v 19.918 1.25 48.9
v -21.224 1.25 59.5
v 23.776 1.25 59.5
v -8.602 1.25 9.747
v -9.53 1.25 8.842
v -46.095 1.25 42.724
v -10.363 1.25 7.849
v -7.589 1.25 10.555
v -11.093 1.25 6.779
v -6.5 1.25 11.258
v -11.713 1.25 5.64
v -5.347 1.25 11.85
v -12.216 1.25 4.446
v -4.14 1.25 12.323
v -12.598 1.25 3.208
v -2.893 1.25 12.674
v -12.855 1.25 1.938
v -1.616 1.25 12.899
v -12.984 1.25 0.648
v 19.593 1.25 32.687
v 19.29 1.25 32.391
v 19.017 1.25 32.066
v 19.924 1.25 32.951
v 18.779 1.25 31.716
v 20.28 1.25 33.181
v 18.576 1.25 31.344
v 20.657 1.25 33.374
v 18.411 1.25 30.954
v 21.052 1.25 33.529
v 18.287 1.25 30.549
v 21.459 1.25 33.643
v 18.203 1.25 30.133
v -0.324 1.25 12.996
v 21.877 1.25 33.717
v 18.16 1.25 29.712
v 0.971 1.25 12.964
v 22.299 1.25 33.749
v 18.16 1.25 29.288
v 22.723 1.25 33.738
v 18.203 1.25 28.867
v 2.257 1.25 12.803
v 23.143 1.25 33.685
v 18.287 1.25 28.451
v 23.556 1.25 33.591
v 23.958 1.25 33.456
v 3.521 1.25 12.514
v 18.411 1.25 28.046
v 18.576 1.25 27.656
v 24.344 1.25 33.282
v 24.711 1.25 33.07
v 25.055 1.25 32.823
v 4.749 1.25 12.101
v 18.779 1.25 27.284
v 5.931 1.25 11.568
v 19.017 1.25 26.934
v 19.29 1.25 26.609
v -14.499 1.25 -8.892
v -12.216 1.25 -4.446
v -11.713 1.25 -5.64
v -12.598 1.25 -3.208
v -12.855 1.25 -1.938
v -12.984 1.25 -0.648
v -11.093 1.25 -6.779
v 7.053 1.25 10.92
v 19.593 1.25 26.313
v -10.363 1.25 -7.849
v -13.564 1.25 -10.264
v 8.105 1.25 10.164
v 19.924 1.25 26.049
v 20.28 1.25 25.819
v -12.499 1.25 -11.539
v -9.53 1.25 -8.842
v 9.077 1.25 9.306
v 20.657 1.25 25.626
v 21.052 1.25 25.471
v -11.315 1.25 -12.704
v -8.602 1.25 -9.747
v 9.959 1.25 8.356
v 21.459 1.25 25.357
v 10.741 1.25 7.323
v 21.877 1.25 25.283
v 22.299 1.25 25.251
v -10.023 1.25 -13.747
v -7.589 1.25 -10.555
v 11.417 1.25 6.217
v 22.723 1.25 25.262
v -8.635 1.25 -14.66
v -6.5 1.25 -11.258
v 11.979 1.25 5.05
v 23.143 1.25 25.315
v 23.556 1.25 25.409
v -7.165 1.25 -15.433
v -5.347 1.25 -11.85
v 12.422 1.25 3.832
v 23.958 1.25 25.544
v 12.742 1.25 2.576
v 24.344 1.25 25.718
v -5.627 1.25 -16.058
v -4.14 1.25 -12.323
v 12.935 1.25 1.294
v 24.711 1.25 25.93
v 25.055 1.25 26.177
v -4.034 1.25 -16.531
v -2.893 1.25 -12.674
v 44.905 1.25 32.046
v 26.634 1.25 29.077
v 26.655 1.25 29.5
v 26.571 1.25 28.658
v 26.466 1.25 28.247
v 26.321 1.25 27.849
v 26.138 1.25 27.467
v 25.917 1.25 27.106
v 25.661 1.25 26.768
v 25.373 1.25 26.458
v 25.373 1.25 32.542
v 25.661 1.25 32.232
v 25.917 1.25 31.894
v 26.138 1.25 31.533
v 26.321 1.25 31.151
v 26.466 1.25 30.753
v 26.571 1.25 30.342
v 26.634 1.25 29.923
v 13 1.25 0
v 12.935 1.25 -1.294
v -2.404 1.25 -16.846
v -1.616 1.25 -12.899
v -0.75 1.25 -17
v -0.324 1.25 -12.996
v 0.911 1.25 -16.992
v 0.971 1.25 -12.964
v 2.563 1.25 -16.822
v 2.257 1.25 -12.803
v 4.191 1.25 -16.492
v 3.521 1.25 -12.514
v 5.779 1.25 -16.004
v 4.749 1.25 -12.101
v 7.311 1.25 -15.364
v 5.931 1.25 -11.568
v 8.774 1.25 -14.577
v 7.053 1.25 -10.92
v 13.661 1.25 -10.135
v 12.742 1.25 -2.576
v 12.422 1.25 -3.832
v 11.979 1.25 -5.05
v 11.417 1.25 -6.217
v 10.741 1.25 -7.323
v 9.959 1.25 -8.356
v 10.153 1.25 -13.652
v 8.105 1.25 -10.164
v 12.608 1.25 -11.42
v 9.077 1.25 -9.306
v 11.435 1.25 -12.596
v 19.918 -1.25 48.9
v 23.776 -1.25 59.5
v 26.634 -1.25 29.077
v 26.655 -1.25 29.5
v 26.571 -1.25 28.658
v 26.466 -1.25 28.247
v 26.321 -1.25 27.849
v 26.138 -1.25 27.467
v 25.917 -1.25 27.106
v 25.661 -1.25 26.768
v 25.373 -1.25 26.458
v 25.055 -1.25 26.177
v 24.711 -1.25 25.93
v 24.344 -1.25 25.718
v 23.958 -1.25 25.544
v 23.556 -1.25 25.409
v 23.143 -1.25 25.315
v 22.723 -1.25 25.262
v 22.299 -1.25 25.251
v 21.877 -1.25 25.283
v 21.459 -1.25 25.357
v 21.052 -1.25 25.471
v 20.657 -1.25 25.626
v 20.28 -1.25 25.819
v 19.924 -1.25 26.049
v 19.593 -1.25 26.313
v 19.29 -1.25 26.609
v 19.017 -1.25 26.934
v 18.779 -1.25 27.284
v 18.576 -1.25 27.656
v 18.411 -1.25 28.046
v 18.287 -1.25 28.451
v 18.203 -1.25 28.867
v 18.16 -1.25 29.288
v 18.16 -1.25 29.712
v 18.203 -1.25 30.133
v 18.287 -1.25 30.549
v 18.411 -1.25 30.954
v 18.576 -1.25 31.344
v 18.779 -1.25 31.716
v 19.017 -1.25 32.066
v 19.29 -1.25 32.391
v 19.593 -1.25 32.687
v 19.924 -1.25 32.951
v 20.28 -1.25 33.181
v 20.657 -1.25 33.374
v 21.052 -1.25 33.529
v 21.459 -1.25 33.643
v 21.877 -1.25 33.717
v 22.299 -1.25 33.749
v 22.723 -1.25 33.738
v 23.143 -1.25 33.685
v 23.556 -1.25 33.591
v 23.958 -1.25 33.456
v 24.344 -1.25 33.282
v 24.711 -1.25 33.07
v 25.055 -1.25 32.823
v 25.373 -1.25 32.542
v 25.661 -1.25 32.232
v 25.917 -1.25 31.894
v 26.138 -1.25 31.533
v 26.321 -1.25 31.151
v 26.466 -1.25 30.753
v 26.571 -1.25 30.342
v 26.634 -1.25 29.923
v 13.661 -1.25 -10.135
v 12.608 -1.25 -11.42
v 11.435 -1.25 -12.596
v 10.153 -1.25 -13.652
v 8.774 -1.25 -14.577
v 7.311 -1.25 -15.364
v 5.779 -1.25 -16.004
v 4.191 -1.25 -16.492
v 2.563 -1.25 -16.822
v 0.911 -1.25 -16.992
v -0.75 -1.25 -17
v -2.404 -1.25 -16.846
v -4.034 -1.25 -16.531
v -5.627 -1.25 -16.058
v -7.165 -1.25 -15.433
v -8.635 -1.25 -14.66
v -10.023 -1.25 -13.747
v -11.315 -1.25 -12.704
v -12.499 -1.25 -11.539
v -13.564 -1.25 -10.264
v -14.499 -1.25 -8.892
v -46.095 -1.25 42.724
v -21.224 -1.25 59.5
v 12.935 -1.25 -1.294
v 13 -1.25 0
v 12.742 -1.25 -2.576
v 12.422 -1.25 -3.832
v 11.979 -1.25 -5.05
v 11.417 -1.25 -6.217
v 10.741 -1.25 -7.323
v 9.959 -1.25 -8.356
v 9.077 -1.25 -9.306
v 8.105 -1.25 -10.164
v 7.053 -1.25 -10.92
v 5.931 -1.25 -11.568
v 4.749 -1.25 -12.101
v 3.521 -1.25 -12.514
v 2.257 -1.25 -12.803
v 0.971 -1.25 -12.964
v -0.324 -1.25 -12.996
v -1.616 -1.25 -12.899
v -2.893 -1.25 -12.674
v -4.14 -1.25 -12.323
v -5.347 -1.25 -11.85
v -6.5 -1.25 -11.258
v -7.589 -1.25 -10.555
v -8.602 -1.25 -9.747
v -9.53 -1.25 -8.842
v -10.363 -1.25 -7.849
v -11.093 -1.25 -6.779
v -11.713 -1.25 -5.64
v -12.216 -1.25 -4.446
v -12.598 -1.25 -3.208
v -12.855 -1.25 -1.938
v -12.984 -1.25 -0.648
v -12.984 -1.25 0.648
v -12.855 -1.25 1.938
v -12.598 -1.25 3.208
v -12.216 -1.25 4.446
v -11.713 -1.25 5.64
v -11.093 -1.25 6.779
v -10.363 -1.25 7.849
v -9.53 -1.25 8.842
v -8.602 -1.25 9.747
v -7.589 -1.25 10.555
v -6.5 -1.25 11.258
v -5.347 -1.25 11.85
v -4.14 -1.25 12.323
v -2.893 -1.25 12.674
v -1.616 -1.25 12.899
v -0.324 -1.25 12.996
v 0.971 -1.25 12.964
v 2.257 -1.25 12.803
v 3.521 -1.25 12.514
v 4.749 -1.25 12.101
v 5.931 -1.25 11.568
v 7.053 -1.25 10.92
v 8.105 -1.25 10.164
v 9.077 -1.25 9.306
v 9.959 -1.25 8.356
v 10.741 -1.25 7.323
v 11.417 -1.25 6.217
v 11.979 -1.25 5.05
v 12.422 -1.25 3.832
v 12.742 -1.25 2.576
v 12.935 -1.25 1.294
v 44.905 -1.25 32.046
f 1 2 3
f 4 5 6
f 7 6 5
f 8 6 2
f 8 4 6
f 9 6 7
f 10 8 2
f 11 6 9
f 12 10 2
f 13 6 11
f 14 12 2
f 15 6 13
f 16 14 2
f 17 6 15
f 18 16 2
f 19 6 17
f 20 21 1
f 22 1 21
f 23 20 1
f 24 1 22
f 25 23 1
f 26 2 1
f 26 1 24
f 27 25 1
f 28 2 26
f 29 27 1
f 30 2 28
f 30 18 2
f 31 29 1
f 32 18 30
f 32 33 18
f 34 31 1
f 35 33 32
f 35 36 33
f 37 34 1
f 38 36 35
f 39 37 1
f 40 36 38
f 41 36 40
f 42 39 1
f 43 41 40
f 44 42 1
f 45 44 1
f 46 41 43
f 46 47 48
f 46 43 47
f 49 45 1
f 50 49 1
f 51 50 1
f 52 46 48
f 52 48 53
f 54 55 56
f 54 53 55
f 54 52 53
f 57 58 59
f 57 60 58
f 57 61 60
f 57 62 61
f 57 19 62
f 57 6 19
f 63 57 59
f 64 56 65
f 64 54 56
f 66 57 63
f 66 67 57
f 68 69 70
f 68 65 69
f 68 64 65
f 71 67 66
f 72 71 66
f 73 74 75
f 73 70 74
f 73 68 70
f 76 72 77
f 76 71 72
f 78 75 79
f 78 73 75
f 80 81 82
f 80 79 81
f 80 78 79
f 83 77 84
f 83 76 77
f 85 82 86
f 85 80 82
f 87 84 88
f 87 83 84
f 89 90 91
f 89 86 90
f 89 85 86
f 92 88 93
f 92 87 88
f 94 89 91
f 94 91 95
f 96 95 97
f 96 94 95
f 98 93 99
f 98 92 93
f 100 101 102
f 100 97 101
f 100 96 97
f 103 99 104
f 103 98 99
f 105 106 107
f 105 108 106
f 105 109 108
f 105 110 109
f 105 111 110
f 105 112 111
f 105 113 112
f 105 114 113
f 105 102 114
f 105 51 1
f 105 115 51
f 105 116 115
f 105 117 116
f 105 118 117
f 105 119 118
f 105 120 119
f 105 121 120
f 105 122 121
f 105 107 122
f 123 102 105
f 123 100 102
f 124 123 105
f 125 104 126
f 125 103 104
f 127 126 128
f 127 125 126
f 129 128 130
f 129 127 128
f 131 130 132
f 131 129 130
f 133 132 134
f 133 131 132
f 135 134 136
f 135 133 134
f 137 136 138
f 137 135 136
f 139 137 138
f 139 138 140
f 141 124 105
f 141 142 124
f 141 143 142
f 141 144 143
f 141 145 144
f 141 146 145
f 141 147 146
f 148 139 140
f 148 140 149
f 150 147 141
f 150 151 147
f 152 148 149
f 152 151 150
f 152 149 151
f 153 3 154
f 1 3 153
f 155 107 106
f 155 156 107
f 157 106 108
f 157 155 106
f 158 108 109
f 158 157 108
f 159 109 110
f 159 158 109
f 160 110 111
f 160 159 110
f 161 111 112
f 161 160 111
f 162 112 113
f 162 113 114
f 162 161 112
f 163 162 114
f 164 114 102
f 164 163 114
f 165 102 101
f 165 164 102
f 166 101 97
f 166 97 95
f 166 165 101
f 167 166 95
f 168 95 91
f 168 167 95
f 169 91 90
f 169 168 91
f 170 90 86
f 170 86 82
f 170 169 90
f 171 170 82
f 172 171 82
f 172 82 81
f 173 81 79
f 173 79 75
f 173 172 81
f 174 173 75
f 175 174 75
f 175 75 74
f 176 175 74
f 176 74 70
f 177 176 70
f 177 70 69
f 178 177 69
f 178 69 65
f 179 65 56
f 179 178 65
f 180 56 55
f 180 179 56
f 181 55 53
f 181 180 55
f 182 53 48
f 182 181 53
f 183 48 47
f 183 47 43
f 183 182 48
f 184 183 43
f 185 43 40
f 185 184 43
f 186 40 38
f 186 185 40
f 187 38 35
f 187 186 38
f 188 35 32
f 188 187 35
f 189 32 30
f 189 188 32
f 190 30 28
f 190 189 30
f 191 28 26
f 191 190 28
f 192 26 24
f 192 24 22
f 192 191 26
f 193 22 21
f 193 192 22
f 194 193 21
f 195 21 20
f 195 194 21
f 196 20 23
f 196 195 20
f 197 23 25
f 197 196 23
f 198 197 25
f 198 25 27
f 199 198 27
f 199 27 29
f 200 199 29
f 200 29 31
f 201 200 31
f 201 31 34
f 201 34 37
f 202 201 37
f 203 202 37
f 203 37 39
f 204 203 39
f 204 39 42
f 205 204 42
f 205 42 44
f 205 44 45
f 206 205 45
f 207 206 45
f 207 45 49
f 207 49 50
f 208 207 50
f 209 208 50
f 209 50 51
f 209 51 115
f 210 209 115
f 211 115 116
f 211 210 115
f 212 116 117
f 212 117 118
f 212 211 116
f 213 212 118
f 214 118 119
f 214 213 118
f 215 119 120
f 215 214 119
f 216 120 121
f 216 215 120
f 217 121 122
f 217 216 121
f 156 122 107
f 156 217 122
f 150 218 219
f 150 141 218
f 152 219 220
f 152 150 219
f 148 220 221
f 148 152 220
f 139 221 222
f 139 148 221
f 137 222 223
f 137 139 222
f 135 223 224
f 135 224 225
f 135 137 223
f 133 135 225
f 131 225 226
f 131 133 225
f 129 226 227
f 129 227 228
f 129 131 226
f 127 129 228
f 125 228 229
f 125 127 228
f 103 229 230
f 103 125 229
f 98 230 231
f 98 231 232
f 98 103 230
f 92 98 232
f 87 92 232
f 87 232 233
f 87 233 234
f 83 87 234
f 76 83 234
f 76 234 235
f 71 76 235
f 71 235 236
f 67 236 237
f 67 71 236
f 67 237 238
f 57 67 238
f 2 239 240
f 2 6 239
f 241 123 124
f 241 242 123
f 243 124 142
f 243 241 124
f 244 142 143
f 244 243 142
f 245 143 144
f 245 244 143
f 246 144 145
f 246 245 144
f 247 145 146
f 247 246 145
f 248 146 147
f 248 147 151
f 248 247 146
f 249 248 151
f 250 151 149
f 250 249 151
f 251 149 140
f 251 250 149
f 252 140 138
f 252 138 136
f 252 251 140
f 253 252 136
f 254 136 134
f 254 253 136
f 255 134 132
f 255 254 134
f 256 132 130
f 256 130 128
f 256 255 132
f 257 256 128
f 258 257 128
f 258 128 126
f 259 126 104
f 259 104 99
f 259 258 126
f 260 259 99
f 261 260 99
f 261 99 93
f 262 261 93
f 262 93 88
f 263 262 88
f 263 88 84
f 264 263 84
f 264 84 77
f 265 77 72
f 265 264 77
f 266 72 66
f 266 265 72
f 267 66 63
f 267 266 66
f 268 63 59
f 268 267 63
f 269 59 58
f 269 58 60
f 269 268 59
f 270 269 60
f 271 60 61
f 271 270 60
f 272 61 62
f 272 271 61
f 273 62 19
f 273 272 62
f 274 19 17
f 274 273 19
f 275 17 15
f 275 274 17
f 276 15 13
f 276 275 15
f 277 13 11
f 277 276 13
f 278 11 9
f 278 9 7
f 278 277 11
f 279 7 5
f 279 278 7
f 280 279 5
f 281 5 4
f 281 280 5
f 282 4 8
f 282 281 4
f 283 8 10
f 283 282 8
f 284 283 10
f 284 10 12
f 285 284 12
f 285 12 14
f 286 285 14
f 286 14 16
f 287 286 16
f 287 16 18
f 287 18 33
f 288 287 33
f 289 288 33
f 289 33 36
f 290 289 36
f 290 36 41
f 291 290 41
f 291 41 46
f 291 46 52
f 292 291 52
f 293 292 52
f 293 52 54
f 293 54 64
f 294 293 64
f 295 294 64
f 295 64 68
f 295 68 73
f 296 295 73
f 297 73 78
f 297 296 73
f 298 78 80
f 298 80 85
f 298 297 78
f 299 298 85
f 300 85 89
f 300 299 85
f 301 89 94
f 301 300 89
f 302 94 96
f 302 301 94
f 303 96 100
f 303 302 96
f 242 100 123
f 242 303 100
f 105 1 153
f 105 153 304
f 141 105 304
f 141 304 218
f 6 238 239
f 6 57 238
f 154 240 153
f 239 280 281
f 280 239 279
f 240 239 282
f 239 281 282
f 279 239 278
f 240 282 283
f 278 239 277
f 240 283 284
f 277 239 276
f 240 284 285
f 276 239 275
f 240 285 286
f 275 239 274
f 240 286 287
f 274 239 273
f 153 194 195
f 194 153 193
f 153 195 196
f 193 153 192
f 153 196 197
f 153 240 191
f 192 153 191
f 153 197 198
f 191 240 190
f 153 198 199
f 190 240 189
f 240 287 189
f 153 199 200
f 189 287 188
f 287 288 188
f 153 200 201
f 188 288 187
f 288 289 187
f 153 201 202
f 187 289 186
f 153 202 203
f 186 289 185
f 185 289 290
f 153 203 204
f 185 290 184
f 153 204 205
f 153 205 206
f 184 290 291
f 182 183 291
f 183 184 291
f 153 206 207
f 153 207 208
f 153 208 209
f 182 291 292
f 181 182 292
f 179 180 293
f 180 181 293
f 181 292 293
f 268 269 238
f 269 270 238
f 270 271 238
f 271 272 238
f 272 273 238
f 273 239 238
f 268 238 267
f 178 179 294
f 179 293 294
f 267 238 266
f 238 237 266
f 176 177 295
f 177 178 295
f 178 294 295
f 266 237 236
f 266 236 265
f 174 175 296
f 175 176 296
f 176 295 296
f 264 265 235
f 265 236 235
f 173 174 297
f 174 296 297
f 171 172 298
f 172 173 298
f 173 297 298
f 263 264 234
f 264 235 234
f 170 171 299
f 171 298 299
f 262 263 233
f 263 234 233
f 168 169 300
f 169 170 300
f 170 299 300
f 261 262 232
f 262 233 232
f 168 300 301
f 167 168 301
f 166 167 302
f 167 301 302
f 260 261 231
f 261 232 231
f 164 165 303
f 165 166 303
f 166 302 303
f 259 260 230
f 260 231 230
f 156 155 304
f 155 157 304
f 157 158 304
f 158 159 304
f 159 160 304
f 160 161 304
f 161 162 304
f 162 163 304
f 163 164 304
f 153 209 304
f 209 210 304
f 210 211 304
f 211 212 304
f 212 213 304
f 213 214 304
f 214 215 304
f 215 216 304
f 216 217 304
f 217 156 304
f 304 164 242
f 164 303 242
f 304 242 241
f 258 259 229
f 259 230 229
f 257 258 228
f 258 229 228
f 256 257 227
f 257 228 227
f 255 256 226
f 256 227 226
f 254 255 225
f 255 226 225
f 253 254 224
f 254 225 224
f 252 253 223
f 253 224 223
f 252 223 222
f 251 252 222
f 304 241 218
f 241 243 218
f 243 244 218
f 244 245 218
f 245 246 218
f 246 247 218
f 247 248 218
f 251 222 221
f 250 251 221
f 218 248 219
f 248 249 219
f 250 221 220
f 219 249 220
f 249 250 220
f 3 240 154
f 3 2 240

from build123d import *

# Parameters (mm, degrees)
SKETCH1_R           = 13
SKETCH1_R_2         = 4.25
BOSS_EXTRUDE1_DEPTH = 1.25


with BuildPart() as part:
    # Sketch1 → Boss-Extrude1 (new body, symmetric)
    with BuildSketch(Plane(origin=(0, 0, 0), x_dir=(1, 0, 0), z_dir=(0, 1, 0))):
        with BuildLine():
            Line((-21.223783798, -59.5), (23.776216202, -59.5))
            Line((23.776216202, -59.5), (19.918131719, -48.9))
            Line((19.918131719, -48.9), (44.905089026, -32.046084487))
            Line((44.905089026, -32.046084487), (13.660617354, 10.13521746))
            ThreePointArc((13.660617354, 10.13521746), (-0.749839352, 17), (-14.499227131, 8.891927633))
            Line((-14.499227131, 8.891927633), (-46.094910974, -42.724212896))
            Line((-46.094910974, -42.724212896), (-21.223783798, -59.5))
        make_face()
        Circle(SKETCH1_R, mode=Mode.SUBTRACT)
        with Locations((22.405089026, -29.5)):
            Circle(SKETCH1_R_2, mode=Mode.SUBTRACT)
    extrude(amount=BOSS_EXTRUDE1_DEPTH, both=True)


solid = part.part
